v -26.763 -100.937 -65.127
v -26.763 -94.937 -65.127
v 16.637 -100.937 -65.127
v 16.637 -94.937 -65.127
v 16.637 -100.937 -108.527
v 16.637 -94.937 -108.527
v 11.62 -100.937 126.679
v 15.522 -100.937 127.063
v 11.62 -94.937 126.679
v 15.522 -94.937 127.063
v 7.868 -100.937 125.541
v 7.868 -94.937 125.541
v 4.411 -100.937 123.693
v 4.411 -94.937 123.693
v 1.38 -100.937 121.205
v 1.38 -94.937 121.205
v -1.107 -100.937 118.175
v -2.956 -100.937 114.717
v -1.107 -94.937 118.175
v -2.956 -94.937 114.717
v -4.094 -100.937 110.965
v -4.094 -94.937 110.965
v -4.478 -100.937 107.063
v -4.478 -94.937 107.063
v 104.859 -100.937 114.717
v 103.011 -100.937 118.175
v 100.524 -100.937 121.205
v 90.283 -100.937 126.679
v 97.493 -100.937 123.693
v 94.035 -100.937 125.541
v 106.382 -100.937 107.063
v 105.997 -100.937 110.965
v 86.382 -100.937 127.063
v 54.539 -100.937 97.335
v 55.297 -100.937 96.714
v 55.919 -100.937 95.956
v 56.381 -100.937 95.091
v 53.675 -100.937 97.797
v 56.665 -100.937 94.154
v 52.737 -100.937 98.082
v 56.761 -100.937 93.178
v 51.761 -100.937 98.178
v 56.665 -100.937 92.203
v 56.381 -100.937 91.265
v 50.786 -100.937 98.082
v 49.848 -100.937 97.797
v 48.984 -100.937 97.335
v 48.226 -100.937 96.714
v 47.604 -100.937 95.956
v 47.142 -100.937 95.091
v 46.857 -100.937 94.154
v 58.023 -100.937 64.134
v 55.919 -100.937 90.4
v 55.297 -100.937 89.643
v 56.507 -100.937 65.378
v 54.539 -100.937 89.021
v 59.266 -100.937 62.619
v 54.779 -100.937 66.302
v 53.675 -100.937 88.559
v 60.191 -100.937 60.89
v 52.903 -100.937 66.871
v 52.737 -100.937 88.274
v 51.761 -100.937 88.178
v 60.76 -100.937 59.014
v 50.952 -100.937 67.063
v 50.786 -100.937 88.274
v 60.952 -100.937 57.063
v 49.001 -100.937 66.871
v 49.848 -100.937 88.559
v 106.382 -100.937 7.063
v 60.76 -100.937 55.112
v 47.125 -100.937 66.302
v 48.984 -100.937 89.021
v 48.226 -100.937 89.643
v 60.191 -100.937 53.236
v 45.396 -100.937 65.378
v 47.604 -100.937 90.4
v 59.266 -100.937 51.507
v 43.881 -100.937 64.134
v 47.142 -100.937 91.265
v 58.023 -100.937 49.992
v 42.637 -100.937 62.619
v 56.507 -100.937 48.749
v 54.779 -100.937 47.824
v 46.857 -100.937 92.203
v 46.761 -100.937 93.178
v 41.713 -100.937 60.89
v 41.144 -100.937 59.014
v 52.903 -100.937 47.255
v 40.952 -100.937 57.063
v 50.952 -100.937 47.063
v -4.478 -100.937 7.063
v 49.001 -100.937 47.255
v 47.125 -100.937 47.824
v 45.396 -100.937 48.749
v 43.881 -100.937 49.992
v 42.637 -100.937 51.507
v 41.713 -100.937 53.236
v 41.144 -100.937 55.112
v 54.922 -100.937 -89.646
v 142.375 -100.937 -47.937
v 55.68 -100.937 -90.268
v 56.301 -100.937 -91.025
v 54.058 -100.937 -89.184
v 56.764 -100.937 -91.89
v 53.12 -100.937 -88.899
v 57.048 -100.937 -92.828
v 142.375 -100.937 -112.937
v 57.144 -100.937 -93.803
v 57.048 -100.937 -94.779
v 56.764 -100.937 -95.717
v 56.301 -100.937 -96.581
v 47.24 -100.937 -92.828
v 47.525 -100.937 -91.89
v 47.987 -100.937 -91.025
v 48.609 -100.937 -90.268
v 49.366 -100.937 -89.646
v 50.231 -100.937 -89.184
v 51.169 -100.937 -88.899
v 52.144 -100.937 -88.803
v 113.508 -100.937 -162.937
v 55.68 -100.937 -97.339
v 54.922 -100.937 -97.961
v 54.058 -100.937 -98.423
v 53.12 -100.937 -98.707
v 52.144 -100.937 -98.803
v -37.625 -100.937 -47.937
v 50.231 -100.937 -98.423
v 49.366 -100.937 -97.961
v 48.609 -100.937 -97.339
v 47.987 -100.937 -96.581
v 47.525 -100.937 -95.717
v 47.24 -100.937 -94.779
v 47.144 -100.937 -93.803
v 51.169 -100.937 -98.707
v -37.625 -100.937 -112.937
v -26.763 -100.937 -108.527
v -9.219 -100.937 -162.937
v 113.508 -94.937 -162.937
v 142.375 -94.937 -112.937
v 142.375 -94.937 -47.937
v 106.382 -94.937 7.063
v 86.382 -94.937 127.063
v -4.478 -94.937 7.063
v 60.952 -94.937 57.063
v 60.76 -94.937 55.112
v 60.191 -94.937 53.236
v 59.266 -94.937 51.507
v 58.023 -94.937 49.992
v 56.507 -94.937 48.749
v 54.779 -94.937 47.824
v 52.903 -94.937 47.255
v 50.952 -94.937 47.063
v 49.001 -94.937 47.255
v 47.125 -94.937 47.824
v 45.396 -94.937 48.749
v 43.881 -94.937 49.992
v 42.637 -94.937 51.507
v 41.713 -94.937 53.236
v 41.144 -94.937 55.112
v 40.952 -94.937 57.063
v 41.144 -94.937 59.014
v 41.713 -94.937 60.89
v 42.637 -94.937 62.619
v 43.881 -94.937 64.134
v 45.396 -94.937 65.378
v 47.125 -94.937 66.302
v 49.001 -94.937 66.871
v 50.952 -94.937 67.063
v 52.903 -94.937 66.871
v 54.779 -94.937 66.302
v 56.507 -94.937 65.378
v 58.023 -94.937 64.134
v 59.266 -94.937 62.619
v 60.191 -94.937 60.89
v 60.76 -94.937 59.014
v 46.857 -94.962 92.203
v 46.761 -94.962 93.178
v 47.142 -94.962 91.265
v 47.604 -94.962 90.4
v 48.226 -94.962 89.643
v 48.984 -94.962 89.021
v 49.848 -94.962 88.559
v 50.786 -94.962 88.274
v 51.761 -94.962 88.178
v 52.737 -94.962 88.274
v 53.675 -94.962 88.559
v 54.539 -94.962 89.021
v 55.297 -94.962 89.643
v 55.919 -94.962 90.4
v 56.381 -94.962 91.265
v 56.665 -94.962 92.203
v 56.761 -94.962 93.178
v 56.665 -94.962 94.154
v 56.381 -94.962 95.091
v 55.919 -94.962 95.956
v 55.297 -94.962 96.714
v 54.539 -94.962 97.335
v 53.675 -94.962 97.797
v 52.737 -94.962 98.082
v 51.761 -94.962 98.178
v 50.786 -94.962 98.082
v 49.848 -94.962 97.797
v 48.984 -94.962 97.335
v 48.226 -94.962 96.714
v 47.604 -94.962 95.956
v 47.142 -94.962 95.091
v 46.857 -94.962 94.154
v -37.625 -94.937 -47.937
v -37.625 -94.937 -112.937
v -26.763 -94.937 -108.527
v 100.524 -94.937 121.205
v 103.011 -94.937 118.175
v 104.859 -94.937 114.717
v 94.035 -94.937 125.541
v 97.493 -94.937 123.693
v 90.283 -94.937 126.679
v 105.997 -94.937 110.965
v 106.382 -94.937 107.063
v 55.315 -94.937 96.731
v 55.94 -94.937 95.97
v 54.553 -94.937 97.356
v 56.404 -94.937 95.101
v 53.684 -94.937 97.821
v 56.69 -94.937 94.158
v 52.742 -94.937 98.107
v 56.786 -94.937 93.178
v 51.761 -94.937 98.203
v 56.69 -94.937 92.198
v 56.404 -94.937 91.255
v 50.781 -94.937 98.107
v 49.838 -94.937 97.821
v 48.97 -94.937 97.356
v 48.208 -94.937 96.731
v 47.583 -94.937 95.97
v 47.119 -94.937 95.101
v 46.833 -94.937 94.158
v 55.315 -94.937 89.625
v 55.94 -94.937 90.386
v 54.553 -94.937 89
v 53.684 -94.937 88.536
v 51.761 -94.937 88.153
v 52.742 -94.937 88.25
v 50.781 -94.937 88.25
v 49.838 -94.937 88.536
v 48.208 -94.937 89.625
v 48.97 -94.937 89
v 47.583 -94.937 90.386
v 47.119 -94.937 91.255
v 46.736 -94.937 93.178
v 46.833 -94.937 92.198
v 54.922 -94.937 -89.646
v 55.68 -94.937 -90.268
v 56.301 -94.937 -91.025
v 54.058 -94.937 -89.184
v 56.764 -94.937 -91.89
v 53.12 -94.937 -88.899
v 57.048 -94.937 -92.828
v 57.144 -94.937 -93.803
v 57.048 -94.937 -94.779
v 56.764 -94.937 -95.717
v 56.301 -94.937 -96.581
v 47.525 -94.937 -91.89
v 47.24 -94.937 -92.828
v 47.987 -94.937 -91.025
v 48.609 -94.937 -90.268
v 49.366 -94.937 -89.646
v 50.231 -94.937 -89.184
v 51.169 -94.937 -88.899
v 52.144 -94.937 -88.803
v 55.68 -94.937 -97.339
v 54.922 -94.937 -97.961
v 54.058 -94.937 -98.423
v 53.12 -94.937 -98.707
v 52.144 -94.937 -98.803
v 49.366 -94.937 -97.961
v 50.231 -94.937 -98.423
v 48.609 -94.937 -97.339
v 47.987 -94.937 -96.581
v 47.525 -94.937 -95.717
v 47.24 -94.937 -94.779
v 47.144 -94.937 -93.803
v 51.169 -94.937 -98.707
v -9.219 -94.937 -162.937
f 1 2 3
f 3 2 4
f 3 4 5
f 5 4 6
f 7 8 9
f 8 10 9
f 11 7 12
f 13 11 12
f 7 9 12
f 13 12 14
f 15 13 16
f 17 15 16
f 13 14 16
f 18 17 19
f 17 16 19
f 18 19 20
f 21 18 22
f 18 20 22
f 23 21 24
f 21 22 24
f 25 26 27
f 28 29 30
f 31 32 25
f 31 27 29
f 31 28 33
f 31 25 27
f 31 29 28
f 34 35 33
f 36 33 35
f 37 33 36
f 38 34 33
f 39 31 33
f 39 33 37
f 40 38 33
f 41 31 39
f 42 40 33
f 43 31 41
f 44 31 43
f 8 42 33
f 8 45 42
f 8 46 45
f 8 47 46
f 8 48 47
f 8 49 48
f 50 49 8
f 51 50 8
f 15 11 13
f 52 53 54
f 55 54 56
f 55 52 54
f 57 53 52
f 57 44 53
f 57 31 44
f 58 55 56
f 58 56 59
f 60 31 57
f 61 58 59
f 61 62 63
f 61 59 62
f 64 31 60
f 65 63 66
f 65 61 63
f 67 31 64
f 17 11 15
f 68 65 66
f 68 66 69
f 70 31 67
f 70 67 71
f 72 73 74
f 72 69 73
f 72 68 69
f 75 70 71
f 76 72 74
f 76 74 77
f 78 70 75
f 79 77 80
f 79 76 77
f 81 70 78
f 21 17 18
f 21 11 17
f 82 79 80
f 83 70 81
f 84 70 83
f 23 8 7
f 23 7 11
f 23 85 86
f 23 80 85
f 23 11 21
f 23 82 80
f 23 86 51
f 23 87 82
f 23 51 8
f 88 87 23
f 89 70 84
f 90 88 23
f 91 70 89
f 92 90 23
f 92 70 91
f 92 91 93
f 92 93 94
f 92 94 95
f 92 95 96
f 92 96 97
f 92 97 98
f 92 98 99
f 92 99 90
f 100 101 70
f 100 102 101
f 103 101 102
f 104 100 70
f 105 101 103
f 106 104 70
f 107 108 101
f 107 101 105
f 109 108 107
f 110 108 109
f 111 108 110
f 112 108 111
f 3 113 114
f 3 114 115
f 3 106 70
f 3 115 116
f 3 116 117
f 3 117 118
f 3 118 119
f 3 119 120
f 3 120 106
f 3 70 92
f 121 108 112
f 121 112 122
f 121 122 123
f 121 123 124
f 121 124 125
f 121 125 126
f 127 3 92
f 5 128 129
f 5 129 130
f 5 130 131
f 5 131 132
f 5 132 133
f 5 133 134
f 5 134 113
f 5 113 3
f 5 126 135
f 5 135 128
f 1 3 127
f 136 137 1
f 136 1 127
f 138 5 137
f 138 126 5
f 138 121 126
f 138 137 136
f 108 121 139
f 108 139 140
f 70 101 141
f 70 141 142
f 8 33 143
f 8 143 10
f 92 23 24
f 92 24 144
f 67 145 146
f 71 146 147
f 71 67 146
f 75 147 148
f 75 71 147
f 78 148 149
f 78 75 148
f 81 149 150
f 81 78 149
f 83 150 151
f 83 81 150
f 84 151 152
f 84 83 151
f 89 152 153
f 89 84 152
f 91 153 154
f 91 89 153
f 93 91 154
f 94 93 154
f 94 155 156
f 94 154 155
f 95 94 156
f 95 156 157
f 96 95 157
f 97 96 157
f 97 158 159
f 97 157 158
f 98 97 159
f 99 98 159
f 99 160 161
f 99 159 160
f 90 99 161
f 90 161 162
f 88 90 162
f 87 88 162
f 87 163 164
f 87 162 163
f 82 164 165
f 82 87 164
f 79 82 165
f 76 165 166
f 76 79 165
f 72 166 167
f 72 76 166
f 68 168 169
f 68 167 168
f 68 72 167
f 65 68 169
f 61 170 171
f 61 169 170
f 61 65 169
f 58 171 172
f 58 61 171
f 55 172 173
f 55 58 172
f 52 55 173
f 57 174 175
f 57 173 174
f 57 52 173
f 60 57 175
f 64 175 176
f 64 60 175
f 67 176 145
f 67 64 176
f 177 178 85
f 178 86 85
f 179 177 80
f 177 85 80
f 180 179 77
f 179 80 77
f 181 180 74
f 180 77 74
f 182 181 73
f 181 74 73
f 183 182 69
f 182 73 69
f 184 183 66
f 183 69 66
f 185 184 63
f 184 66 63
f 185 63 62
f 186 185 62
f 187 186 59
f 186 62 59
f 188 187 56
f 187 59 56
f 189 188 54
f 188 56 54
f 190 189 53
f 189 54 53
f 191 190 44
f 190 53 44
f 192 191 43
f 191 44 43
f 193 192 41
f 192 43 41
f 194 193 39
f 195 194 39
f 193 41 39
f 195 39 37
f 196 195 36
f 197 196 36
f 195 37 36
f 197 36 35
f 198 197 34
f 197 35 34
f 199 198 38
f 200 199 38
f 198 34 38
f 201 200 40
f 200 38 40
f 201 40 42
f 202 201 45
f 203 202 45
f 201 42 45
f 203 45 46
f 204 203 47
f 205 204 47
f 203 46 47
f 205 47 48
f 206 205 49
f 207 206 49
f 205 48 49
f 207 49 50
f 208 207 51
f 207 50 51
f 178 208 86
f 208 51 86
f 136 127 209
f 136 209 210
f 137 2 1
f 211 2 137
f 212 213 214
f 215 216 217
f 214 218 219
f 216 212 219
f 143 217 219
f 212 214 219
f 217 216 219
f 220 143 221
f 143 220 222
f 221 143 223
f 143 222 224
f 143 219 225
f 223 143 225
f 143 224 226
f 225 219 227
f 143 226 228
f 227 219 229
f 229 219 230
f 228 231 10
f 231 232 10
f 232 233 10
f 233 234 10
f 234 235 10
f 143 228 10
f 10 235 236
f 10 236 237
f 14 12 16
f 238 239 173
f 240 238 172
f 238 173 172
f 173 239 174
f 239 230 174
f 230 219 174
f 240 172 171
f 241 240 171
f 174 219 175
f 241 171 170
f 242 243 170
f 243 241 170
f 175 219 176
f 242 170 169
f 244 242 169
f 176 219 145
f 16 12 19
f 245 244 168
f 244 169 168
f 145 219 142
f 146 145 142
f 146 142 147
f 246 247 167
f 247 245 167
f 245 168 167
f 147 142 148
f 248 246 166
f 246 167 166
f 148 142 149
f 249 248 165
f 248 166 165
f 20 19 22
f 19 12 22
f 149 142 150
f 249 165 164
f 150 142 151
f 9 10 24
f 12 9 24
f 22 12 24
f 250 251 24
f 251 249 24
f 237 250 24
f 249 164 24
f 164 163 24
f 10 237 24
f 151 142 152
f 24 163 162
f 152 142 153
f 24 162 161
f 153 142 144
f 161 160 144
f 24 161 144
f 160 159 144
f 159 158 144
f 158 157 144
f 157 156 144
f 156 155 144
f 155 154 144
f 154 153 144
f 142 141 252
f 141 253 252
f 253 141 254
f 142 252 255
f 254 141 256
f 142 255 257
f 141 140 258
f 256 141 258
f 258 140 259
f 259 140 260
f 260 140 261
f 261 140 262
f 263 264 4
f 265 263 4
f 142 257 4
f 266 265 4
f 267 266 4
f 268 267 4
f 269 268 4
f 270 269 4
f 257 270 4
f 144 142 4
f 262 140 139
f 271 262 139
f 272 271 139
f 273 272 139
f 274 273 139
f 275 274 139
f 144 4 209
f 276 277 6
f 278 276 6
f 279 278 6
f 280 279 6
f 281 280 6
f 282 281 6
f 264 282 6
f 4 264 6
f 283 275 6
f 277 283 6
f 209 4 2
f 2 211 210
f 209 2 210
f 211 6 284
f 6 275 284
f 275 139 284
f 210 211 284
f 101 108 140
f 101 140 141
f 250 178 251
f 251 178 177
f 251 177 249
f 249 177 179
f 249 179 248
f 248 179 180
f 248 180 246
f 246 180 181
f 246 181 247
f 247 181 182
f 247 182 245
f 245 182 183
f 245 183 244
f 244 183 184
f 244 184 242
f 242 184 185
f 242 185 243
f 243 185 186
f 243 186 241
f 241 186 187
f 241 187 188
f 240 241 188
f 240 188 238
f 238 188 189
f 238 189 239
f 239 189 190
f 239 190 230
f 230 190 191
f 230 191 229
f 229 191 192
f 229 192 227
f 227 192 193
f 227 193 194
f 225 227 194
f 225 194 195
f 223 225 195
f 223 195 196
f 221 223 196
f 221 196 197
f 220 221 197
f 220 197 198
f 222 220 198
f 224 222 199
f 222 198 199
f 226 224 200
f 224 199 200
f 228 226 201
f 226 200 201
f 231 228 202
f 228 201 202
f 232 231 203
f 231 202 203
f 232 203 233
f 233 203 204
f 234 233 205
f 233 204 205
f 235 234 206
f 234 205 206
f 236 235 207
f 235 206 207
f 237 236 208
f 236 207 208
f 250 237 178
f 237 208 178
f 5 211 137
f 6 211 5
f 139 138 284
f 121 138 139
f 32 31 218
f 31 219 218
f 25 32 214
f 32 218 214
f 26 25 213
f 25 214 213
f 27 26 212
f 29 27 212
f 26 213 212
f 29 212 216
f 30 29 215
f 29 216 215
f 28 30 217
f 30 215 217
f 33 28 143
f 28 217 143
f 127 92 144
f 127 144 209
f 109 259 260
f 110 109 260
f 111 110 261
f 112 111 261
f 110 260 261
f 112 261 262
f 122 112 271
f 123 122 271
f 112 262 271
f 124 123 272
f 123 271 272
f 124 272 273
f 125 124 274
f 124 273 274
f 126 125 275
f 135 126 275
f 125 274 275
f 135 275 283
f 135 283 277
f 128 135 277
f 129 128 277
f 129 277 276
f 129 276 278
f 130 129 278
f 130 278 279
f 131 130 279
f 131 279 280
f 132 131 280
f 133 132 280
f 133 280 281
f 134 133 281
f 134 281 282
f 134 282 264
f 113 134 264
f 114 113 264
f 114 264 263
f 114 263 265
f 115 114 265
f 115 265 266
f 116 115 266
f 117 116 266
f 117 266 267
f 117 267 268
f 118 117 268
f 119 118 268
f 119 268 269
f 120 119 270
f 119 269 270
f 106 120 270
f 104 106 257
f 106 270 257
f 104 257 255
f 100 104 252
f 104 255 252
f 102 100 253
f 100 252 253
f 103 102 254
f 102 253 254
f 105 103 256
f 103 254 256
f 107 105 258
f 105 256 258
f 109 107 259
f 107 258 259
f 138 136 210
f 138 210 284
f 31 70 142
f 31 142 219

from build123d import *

# Parameters (mm, degrees)
BOSS_EXTRUDE1_DEPTH              = 6
FILLET1_R                        = 20
FILLET2_R                        = 20
SKETCH30_R                       = 10
CUT_EXTRUDE44_DEPTH              = 7
CUT_EXTRUDE44_DEPTH_BACK         = 1
SKETCH31_R                       = 5
CUT_EXTRUDE45_DEPTH              = 10
BODY_MOVE_COPY3_ANGLE            = 90
BODY_MOVE_COPY4_ANGLE            = 180
F_10_0MM_DOWEL_HOLE1_D           = 10
F_10_0MM_DOWEL_HOLE1_DEPTH       = 50
F_10_0MM_DOWEL_HOLE1_CSINK_D     = 10.05
F_10_0MM_DOWEL_HOLE1_CSINK_ANGLE = 90
F_10_0MM_DOWEL_HOLE1_TIP         = 3.004303095
SKETCH35_W                       = 43.4
SKETCH35_H                       = 43.4
CUT_EXTRUDE46_DEPTH              = 200


with BuildPart() as part:
    # Sketch6 → Boss-Extrude1 (new body)
    with BuildSketch(Plane.XY):
        Polygon((-61.363636364, 0), (61.363636364, 0), (90.231149823, -50), (90.231149823, -115), (54.237430104, -170), (54.237430104, -290), (-56.622130409, -290), (-56.622130409, -170), (-89.768850177, -115), (-89.768850177, -50), align=None)
    extrude(amount=BOSS_EXTRUDE1_DEPTH)

    # Fillet1
    fillet1_edges = [part.edges().sort_by_distance(p)[0] for p in [
        (54.237430104, -290, 3),
    ]]
    fillet(fillet1_edges, radius=FILLET1_R)

    # Fillet2
    fillet2_edges = [part.edges().sort_by_distance(p)[0] for p in [
        (-56.622130409, -290, 3),
    ]]
    fillet(fillet2_edges, radius=FILLET2_R)

    # Sketch30 → Cut-Extrude44 (cut, two sides)
    with BuildSketch(Plane.XY) as cut_extrude44_sk:
        with Locations((-1.192350152, -220)):
            Circle(SKETCH30_R)
    extrude(amount=CUT_EXTRUDE44_DEPTH, mode=Mode.SUBTRACT)
    extrude(cut_extrude44_sk.sketch, amount=-CUT_EXTRUDE44_DEPTH_BACK, mode=Mode.SUBTRACT)

    # Sketch31 → Cut-Extrude45 (cut)
    with BuildSketch(Plane.XY.offset(6)):
        with Locations((0, -69.133646514)):
            Circle(SKETCH31_R)
    extrude(amount=-CUT_EXTRUDE45_DEPTH, mode=Mode.SUBTRACT)


with BuildPart() as part_1:
    # Body-Move/Copy3: moved
    add(part.part.rotate(Axis((0, -121.936798964, -1), (1, 0, 0)), BODY_MOVE_COPY3_ANGLE))


with BuildPart() as part_2:
    # Body-Move/Copy4: moved
    add(part_1.part.rotate(Axis((0, -111.936798964, -21), (1, 0, 0)), BODY_MOVE_COPY4_ANGLE))


with BuildPart() as part_3:
    # Body-Move/Copy5: moved
    add(part_2.part.moved(Location((52.144140366, 0, 0))))

    # Ø10.0mm Dowel Hole1
    with Locations(Plane(origin=(0, -94.936798964, 0), x_dir=(1, 0, 0), z_dir=(0, 1, 0))):
        with Locations((51.761395867, -93.178073243)):
            CounterSinkHole(F_10_0MM_DOWEL_HOLE1_D / 2, F_10_0MM_DOWEL_HOLE1_CSINK_D / 2, depth=F_10_0MM_DOWEL_HOLE1_DEPTH, counter_sink_angle=F_10_0MM_DOWEL_HOLE1_CSINK_ANGLE)
            with Locations((0, 0, -(F_10_0MM_DOWEL_HOLE1_DEPTH + F_10_0MM_DOWEL_HOLE1_TIP / 2))):  # 118° drill point
                Cone(0, F_10_0MM_DOWEL_HOLE1_D / 2, F_10_0MM_DOWEL_HOLE1_TIP, mode=Mode.SUBTRACT)

    # Sketch35 → Cut-Extrude46 (cut)
    with BuildSketch(Plane(origin=(0, 0, 0), x_dir=(1, 0, 0), z_dir=(0, 1, 0))):
        with Locations((-5.062927598, 86.826541805)):
            Rectangle(SKETCH35_W, SKETCH35_H)
    extrude(amount=-CUT_EXTRUDE46_DEPTH, mode=Mode.SUBTRACT)


solid = part_3.part
